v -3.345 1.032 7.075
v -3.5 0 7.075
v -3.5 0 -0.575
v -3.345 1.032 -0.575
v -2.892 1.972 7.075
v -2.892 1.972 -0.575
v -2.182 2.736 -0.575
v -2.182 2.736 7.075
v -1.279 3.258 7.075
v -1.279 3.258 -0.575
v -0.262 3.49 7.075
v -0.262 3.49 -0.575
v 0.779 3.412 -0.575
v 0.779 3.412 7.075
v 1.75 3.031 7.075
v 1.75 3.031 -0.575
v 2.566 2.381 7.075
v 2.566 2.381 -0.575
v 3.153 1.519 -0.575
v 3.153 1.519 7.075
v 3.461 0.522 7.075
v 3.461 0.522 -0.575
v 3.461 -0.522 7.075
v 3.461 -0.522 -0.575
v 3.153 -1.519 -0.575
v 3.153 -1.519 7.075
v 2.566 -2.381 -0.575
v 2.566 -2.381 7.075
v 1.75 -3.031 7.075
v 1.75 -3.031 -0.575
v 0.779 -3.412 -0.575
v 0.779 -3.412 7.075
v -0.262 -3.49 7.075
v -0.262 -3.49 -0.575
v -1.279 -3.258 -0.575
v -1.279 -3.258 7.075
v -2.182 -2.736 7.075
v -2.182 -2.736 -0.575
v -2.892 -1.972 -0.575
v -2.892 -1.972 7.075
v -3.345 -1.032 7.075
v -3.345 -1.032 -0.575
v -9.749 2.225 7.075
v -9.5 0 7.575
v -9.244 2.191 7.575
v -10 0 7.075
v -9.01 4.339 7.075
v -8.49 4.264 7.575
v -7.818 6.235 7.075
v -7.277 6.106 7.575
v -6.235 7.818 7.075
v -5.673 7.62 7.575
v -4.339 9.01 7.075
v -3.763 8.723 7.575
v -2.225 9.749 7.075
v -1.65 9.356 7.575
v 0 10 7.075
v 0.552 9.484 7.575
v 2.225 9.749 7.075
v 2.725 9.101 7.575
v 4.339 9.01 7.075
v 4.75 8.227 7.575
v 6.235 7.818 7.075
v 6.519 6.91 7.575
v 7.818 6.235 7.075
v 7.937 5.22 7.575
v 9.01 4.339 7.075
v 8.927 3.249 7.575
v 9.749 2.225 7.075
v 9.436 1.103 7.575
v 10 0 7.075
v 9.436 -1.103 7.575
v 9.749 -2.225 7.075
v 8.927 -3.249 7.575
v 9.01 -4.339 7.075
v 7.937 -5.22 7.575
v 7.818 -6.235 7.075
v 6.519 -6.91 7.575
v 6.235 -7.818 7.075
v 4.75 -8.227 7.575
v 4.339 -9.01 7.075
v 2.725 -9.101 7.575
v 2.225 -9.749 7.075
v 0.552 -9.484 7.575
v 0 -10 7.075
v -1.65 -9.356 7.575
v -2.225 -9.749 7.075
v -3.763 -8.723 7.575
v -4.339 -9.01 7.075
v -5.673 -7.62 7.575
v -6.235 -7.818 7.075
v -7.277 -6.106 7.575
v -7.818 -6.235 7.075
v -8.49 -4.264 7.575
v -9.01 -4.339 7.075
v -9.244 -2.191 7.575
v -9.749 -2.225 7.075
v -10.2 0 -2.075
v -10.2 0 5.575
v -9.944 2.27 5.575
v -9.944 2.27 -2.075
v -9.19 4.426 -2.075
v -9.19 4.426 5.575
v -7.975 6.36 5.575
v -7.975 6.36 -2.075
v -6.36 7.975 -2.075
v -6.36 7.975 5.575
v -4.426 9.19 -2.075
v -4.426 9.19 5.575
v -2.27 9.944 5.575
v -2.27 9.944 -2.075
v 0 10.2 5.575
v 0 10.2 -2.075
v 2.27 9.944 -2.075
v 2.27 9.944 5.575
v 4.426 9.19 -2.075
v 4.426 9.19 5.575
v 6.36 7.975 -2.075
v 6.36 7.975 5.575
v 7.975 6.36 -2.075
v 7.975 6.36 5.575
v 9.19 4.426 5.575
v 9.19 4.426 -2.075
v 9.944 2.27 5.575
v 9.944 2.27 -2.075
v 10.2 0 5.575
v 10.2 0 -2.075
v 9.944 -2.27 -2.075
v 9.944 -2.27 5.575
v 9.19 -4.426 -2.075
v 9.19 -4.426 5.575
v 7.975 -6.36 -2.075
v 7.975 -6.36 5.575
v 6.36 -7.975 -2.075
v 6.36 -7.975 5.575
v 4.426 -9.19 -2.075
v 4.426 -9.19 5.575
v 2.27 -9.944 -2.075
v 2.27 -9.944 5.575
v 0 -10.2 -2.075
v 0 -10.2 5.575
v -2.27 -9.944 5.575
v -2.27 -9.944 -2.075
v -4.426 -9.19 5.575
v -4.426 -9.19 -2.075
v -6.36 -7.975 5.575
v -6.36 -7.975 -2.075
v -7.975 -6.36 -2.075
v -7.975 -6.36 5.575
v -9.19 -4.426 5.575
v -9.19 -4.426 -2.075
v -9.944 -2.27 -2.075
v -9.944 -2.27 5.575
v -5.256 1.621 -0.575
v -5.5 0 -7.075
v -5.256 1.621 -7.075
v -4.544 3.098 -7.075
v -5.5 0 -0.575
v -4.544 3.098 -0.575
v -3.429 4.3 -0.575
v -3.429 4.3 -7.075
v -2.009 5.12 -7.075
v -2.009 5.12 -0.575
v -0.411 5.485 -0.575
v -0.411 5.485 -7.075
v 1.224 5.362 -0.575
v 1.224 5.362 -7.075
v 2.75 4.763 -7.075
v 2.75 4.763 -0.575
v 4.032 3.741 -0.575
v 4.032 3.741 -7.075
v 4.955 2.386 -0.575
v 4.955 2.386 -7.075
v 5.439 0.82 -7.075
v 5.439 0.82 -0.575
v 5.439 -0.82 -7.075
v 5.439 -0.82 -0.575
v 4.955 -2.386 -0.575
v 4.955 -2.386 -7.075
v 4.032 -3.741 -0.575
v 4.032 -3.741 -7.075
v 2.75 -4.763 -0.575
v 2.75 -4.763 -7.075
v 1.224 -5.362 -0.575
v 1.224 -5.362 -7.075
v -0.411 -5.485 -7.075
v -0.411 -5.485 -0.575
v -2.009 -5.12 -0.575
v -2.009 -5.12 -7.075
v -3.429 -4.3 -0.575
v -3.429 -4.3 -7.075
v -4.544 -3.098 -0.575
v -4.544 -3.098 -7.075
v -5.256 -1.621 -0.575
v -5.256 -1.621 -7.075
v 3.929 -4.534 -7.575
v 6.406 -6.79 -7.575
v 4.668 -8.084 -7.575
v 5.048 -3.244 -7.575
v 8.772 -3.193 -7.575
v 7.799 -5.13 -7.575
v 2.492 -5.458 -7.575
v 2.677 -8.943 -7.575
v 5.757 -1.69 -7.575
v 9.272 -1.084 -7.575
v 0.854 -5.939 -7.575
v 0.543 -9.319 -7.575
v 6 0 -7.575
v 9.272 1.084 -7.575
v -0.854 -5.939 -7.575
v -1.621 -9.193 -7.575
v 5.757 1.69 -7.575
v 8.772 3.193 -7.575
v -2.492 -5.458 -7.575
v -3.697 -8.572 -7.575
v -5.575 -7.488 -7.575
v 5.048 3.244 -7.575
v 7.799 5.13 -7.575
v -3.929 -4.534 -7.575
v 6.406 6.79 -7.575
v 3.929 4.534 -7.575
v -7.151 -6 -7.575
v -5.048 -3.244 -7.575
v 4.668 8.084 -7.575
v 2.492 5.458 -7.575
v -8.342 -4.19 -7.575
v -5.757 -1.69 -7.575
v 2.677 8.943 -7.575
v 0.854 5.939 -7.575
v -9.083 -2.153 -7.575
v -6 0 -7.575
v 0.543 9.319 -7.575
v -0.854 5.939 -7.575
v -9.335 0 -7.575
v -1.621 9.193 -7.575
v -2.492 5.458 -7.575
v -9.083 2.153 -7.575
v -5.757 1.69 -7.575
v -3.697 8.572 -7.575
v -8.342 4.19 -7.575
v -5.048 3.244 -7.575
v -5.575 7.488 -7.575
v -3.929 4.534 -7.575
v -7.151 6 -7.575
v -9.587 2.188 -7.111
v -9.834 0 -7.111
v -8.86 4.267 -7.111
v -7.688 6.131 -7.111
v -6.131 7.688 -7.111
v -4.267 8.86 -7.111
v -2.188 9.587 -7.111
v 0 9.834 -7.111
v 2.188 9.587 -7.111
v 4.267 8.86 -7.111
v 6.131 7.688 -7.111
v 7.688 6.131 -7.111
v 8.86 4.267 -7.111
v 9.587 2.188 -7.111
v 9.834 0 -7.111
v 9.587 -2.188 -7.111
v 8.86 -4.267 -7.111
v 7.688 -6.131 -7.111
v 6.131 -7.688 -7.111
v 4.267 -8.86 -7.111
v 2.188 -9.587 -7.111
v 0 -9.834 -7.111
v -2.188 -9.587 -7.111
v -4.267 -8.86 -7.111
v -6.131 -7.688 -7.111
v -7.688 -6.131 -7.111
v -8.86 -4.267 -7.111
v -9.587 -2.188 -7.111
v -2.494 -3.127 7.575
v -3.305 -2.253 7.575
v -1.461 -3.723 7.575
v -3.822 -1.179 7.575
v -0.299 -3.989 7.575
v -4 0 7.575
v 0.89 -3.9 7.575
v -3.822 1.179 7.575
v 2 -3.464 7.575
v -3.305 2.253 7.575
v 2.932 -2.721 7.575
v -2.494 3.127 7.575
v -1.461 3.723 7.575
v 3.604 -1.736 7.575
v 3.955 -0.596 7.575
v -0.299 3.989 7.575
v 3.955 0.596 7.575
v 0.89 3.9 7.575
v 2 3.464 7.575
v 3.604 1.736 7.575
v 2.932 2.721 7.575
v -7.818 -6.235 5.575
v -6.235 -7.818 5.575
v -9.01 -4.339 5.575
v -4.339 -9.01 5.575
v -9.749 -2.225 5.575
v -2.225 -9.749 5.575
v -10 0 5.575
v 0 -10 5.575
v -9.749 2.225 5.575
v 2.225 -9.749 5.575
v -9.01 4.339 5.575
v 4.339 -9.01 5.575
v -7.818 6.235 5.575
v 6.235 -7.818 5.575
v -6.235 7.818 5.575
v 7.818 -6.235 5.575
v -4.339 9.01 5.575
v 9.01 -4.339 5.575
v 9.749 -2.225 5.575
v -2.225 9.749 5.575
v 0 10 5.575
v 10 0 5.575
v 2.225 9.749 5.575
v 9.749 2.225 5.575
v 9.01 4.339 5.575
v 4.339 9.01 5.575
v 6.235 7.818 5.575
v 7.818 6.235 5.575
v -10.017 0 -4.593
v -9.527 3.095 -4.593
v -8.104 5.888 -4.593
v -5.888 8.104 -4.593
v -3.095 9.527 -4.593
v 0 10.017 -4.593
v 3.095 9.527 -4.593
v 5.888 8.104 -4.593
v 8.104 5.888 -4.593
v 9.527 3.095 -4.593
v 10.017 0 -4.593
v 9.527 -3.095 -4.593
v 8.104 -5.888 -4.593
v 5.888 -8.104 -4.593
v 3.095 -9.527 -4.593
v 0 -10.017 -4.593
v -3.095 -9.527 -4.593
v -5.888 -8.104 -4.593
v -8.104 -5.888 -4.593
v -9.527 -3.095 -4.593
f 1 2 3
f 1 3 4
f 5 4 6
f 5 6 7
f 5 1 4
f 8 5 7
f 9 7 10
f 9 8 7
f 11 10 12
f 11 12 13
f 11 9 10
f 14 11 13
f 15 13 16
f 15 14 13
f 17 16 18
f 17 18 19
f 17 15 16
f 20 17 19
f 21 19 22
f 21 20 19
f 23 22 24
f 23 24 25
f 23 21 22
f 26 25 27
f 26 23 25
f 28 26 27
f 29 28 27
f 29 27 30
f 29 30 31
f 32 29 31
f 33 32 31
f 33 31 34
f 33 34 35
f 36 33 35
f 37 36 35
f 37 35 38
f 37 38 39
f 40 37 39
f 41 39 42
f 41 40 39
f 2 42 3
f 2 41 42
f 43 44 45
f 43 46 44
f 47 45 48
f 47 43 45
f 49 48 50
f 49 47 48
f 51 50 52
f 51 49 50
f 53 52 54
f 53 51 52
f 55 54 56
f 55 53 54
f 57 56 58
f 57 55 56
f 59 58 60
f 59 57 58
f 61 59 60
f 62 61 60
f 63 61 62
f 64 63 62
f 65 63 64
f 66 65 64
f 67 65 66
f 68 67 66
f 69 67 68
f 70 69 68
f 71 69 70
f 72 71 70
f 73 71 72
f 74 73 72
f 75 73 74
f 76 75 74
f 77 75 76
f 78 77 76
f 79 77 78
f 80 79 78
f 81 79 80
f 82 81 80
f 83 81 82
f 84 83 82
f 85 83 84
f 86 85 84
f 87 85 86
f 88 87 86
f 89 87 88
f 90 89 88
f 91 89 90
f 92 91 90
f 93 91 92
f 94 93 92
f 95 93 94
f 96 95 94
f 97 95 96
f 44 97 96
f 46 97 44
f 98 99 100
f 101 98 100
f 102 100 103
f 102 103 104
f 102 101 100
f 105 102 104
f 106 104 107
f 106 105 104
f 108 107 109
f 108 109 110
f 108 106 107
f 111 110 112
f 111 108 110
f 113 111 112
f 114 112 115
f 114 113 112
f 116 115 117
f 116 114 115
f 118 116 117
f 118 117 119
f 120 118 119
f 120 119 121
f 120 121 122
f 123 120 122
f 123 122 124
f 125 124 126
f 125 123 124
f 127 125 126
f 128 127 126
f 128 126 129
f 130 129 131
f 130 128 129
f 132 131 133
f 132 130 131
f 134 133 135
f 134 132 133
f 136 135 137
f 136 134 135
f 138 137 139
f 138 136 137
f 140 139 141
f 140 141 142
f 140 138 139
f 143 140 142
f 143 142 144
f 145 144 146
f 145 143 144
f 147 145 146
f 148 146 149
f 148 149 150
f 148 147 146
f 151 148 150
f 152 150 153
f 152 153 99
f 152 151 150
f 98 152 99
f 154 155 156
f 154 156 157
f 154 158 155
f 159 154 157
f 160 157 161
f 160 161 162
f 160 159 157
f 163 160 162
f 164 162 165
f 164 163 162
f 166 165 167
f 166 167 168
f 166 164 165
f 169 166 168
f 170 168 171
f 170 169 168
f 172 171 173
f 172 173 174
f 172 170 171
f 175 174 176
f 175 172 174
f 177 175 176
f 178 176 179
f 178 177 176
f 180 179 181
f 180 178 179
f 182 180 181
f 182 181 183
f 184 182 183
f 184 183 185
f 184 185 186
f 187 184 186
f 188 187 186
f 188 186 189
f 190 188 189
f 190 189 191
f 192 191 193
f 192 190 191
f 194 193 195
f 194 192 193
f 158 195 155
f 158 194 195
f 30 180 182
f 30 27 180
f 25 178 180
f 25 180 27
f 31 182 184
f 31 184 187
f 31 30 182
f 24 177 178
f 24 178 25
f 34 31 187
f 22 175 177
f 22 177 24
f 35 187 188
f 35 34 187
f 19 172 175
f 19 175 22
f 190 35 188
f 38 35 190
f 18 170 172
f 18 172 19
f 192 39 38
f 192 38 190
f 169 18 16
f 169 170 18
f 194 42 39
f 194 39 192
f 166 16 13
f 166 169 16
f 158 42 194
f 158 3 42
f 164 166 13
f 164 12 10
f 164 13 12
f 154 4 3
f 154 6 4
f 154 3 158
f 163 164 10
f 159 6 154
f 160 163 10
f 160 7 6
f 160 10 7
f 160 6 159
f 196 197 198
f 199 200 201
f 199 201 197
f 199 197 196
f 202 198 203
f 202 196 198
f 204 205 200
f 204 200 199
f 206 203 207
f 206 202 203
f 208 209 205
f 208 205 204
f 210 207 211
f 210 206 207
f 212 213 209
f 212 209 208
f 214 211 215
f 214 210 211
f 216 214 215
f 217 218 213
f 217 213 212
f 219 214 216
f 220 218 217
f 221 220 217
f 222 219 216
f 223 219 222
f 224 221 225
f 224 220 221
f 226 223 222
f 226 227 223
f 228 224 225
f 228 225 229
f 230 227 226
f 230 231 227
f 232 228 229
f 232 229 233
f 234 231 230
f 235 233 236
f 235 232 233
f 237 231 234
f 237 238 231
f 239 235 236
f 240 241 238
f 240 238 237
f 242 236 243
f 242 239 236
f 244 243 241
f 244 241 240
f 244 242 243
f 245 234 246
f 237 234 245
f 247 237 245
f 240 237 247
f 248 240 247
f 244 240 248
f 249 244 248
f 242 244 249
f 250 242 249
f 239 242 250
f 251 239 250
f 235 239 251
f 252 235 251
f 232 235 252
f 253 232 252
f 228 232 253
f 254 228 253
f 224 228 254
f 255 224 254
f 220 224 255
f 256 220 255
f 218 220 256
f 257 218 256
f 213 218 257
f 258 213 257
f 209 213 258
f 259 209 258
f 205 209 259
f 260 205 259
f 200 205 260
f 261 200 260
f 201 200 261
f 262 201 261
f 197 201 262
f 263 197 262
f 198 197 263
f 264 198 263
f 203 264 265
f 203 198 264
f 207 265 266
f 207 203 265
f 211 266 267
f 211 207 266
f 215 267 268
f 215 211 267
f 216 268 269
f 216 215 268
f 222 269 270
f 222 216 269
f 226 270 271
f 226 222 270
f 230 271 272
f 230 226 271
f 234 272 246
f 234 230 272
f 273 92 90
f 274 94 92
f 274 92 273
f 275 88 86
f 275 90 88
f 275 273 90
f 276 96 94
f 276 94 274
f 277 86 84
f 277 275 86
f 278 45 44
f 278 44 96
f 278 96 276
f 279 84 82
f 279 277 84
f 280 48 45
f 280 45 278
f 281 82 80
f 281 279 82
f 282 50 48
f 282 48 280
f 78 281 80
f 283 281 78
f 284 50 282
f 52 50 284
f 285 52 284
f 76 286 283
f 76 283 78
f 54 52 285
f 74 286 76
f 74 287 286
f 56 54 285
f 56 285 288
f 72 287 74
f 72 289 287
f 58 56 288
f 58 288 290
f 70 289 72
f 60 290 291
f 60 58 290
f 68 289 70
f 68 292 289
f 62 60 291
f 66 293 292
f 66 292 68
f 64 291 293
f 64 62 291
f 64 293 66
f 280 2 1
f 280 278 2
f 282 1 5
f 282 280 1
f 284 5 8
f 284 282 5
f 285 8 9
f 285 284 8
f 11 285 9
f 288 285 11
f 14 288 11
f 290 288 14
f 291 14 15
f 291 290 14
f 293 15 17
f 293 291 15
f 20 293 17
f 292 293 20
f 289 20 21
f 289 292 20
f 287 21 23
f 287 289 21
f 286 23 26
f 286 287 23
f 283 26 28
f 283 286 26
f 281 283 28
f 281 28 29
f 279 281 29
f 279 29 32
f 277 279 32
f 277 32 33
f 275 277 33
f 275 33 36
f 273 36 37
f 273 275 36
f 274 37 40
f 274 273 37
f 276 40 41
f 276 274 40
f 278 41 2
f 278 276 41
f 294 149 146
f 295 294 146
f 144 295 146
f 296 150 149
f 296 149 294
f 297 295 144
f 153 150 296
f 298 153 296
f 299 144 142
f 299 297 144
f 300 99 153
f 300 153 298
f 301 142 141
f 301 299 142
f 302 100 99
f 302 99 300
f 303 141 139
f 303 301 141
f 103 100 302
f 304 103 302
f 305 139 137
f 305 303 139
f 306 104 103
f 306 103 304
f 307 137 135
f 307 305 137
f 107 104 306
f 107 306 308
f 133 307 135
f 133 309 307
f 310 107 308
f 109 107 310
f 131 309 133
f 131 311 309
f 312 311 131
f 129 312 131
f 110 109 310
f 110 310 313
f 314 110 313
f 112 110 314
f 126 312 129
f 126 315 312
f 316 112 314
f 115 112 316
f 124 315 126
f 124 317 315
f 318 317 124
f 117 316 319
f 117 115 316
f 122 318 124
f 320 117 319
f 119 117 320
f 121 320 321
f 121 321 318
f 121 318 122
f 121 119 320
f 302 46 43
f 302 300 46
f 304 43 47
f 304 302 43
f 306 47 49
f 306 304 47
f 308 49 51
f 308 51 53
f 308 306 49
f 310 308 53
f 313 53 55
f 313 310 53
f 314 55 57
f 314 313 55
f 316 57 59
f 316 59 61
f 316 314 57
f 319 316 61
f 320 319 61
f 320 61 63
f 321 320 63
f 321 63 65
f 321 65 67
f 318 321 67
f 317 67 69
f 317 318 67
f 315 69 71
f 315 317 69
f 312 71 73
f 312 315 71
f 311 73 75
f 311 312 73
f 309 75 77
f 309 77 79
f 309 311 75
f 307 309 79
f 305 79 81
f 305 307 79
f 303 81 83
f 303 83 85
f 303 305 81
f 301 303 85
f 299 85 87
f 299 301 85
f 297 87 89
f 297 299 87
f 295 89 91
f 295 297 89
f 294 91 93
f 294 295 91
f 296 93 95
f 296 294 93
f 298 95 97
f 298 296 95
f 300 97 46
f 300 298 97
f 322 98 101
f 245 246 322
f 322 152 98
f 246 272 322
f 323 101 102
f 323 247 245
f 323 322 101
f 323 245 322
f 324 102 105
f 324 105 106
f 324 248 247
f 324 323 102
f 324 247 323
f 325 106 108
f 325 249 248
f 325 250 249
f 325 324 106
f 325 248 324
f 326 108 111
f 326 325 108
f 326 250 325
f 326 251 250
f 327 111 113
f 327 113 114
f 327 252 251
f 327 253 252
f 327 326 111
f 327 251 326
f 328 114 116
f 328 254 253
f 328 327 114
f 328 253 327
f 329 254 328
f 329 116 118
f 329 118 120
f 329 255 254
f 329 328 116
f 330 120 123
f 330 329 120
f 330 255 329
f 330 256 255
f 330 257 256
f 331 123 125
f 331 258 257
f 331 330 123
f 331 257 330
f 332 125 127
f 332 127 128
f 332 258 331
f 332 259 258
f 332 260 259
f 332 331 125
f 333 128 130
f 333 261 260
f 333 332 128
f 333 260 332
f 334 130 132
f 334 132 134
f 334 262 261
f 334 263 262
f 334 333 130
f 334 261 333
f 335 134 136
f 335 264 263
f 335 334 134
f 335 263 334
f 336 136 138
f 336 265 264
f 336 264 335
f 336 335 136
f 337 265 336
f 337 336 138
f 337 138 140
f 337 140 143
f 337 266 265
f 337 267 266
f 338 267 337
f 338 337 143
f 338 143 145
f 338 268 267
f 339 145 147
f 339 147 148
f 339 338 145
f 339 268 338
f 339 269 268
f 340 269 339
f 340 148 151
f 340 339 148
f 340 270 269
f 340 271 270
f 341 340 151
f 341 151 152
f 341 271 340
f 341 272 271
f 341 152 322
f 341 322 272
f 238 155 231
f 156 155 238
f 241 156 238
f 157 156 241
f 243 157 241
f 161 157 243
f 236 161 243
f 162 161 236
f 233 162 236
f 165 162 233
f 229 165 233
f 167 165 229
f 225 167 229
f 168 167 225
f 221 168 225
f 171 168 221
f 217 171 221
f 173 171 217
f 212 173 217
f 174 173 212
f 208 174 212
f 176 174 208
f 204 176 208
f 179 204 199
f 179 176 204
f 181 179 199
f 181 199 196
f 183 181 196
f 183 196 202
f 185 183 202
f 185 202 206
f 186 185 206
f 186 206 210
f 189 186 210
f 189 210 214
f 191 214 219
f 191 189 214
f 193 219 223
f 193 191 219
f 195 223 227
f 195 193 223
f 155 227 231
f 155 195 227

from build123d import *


# Not quite as in the source:
# - a fillet or chamfer that OpenCascade refuses, or shapes differently, is made with other operations: its cross-section is extruded or revolved along the edge and cut away or added


with BuildPart() as f1:
    # F0 (on Front) → F1 (revolve)
    with BuildSketch(Plane.XZ):
        Polygon((-3.5, -0.575), (-3.5, 7.575), (-10, 7.575), (-10, 5.575), (-10.2, 5.575), (-10.2, -2.075), (-9.8, -7.575), (-5.5, -7.575), (-5.5, -0.575), align=None)
    revolve(axis=Axis((0, 0, 0.3696661443), (0, 0, -1)))

    # F2: chamfer of 0.5 on 4 edges, made by hand

    # F2_s1 → F2_t2 (revolve, cut)
    with BuildSketch(Plane.XZ):
        Polygon((-6, -7.575), (-5.5, -7.075), (-5.5, -7.575), align=None)
    revolve(axis=Axis((0, 0, -7.575), (0, 0, -1)), mode=Mode.SUBTRACT)

    # F2_s3 → F2_t4 (revolve, cut)
    with BuildSketch(Plane.XZ):
        Polygon((-9.8337259747, -7.1112678479), (-9.3350430662, -7.575), (-9.8, -7.575), align=None)
    revolve(axis=Axis((0, 0, -7.575), (0, 0, -1)), mode=Mode.SUBTRACT)

    # F2_s5 → F2_t6 (revolve, cut)
    with BuildSketch(Plane.XZ):
        Polygon((-9.5, 7.575), (-10, 7.075), (-10, 7.575), align=None)
    revolve(axis=Axis((0, 0, 7.575), (0, 0, -1)), mode=Mode.SUBTRACT)

    # F2_s7 → F2_t8 (revolve, cut)
    with BuildSketch(Plane.XZ):
        Polygon((-3.5, 7.075), (-4, 7.575), (-3.5, 7.575), align=None)
    revolve(axis=Axis((0, 0, 7.575), (0, 0, -1)), mode=Mode.SUBTRACT)


solid = f1.part
